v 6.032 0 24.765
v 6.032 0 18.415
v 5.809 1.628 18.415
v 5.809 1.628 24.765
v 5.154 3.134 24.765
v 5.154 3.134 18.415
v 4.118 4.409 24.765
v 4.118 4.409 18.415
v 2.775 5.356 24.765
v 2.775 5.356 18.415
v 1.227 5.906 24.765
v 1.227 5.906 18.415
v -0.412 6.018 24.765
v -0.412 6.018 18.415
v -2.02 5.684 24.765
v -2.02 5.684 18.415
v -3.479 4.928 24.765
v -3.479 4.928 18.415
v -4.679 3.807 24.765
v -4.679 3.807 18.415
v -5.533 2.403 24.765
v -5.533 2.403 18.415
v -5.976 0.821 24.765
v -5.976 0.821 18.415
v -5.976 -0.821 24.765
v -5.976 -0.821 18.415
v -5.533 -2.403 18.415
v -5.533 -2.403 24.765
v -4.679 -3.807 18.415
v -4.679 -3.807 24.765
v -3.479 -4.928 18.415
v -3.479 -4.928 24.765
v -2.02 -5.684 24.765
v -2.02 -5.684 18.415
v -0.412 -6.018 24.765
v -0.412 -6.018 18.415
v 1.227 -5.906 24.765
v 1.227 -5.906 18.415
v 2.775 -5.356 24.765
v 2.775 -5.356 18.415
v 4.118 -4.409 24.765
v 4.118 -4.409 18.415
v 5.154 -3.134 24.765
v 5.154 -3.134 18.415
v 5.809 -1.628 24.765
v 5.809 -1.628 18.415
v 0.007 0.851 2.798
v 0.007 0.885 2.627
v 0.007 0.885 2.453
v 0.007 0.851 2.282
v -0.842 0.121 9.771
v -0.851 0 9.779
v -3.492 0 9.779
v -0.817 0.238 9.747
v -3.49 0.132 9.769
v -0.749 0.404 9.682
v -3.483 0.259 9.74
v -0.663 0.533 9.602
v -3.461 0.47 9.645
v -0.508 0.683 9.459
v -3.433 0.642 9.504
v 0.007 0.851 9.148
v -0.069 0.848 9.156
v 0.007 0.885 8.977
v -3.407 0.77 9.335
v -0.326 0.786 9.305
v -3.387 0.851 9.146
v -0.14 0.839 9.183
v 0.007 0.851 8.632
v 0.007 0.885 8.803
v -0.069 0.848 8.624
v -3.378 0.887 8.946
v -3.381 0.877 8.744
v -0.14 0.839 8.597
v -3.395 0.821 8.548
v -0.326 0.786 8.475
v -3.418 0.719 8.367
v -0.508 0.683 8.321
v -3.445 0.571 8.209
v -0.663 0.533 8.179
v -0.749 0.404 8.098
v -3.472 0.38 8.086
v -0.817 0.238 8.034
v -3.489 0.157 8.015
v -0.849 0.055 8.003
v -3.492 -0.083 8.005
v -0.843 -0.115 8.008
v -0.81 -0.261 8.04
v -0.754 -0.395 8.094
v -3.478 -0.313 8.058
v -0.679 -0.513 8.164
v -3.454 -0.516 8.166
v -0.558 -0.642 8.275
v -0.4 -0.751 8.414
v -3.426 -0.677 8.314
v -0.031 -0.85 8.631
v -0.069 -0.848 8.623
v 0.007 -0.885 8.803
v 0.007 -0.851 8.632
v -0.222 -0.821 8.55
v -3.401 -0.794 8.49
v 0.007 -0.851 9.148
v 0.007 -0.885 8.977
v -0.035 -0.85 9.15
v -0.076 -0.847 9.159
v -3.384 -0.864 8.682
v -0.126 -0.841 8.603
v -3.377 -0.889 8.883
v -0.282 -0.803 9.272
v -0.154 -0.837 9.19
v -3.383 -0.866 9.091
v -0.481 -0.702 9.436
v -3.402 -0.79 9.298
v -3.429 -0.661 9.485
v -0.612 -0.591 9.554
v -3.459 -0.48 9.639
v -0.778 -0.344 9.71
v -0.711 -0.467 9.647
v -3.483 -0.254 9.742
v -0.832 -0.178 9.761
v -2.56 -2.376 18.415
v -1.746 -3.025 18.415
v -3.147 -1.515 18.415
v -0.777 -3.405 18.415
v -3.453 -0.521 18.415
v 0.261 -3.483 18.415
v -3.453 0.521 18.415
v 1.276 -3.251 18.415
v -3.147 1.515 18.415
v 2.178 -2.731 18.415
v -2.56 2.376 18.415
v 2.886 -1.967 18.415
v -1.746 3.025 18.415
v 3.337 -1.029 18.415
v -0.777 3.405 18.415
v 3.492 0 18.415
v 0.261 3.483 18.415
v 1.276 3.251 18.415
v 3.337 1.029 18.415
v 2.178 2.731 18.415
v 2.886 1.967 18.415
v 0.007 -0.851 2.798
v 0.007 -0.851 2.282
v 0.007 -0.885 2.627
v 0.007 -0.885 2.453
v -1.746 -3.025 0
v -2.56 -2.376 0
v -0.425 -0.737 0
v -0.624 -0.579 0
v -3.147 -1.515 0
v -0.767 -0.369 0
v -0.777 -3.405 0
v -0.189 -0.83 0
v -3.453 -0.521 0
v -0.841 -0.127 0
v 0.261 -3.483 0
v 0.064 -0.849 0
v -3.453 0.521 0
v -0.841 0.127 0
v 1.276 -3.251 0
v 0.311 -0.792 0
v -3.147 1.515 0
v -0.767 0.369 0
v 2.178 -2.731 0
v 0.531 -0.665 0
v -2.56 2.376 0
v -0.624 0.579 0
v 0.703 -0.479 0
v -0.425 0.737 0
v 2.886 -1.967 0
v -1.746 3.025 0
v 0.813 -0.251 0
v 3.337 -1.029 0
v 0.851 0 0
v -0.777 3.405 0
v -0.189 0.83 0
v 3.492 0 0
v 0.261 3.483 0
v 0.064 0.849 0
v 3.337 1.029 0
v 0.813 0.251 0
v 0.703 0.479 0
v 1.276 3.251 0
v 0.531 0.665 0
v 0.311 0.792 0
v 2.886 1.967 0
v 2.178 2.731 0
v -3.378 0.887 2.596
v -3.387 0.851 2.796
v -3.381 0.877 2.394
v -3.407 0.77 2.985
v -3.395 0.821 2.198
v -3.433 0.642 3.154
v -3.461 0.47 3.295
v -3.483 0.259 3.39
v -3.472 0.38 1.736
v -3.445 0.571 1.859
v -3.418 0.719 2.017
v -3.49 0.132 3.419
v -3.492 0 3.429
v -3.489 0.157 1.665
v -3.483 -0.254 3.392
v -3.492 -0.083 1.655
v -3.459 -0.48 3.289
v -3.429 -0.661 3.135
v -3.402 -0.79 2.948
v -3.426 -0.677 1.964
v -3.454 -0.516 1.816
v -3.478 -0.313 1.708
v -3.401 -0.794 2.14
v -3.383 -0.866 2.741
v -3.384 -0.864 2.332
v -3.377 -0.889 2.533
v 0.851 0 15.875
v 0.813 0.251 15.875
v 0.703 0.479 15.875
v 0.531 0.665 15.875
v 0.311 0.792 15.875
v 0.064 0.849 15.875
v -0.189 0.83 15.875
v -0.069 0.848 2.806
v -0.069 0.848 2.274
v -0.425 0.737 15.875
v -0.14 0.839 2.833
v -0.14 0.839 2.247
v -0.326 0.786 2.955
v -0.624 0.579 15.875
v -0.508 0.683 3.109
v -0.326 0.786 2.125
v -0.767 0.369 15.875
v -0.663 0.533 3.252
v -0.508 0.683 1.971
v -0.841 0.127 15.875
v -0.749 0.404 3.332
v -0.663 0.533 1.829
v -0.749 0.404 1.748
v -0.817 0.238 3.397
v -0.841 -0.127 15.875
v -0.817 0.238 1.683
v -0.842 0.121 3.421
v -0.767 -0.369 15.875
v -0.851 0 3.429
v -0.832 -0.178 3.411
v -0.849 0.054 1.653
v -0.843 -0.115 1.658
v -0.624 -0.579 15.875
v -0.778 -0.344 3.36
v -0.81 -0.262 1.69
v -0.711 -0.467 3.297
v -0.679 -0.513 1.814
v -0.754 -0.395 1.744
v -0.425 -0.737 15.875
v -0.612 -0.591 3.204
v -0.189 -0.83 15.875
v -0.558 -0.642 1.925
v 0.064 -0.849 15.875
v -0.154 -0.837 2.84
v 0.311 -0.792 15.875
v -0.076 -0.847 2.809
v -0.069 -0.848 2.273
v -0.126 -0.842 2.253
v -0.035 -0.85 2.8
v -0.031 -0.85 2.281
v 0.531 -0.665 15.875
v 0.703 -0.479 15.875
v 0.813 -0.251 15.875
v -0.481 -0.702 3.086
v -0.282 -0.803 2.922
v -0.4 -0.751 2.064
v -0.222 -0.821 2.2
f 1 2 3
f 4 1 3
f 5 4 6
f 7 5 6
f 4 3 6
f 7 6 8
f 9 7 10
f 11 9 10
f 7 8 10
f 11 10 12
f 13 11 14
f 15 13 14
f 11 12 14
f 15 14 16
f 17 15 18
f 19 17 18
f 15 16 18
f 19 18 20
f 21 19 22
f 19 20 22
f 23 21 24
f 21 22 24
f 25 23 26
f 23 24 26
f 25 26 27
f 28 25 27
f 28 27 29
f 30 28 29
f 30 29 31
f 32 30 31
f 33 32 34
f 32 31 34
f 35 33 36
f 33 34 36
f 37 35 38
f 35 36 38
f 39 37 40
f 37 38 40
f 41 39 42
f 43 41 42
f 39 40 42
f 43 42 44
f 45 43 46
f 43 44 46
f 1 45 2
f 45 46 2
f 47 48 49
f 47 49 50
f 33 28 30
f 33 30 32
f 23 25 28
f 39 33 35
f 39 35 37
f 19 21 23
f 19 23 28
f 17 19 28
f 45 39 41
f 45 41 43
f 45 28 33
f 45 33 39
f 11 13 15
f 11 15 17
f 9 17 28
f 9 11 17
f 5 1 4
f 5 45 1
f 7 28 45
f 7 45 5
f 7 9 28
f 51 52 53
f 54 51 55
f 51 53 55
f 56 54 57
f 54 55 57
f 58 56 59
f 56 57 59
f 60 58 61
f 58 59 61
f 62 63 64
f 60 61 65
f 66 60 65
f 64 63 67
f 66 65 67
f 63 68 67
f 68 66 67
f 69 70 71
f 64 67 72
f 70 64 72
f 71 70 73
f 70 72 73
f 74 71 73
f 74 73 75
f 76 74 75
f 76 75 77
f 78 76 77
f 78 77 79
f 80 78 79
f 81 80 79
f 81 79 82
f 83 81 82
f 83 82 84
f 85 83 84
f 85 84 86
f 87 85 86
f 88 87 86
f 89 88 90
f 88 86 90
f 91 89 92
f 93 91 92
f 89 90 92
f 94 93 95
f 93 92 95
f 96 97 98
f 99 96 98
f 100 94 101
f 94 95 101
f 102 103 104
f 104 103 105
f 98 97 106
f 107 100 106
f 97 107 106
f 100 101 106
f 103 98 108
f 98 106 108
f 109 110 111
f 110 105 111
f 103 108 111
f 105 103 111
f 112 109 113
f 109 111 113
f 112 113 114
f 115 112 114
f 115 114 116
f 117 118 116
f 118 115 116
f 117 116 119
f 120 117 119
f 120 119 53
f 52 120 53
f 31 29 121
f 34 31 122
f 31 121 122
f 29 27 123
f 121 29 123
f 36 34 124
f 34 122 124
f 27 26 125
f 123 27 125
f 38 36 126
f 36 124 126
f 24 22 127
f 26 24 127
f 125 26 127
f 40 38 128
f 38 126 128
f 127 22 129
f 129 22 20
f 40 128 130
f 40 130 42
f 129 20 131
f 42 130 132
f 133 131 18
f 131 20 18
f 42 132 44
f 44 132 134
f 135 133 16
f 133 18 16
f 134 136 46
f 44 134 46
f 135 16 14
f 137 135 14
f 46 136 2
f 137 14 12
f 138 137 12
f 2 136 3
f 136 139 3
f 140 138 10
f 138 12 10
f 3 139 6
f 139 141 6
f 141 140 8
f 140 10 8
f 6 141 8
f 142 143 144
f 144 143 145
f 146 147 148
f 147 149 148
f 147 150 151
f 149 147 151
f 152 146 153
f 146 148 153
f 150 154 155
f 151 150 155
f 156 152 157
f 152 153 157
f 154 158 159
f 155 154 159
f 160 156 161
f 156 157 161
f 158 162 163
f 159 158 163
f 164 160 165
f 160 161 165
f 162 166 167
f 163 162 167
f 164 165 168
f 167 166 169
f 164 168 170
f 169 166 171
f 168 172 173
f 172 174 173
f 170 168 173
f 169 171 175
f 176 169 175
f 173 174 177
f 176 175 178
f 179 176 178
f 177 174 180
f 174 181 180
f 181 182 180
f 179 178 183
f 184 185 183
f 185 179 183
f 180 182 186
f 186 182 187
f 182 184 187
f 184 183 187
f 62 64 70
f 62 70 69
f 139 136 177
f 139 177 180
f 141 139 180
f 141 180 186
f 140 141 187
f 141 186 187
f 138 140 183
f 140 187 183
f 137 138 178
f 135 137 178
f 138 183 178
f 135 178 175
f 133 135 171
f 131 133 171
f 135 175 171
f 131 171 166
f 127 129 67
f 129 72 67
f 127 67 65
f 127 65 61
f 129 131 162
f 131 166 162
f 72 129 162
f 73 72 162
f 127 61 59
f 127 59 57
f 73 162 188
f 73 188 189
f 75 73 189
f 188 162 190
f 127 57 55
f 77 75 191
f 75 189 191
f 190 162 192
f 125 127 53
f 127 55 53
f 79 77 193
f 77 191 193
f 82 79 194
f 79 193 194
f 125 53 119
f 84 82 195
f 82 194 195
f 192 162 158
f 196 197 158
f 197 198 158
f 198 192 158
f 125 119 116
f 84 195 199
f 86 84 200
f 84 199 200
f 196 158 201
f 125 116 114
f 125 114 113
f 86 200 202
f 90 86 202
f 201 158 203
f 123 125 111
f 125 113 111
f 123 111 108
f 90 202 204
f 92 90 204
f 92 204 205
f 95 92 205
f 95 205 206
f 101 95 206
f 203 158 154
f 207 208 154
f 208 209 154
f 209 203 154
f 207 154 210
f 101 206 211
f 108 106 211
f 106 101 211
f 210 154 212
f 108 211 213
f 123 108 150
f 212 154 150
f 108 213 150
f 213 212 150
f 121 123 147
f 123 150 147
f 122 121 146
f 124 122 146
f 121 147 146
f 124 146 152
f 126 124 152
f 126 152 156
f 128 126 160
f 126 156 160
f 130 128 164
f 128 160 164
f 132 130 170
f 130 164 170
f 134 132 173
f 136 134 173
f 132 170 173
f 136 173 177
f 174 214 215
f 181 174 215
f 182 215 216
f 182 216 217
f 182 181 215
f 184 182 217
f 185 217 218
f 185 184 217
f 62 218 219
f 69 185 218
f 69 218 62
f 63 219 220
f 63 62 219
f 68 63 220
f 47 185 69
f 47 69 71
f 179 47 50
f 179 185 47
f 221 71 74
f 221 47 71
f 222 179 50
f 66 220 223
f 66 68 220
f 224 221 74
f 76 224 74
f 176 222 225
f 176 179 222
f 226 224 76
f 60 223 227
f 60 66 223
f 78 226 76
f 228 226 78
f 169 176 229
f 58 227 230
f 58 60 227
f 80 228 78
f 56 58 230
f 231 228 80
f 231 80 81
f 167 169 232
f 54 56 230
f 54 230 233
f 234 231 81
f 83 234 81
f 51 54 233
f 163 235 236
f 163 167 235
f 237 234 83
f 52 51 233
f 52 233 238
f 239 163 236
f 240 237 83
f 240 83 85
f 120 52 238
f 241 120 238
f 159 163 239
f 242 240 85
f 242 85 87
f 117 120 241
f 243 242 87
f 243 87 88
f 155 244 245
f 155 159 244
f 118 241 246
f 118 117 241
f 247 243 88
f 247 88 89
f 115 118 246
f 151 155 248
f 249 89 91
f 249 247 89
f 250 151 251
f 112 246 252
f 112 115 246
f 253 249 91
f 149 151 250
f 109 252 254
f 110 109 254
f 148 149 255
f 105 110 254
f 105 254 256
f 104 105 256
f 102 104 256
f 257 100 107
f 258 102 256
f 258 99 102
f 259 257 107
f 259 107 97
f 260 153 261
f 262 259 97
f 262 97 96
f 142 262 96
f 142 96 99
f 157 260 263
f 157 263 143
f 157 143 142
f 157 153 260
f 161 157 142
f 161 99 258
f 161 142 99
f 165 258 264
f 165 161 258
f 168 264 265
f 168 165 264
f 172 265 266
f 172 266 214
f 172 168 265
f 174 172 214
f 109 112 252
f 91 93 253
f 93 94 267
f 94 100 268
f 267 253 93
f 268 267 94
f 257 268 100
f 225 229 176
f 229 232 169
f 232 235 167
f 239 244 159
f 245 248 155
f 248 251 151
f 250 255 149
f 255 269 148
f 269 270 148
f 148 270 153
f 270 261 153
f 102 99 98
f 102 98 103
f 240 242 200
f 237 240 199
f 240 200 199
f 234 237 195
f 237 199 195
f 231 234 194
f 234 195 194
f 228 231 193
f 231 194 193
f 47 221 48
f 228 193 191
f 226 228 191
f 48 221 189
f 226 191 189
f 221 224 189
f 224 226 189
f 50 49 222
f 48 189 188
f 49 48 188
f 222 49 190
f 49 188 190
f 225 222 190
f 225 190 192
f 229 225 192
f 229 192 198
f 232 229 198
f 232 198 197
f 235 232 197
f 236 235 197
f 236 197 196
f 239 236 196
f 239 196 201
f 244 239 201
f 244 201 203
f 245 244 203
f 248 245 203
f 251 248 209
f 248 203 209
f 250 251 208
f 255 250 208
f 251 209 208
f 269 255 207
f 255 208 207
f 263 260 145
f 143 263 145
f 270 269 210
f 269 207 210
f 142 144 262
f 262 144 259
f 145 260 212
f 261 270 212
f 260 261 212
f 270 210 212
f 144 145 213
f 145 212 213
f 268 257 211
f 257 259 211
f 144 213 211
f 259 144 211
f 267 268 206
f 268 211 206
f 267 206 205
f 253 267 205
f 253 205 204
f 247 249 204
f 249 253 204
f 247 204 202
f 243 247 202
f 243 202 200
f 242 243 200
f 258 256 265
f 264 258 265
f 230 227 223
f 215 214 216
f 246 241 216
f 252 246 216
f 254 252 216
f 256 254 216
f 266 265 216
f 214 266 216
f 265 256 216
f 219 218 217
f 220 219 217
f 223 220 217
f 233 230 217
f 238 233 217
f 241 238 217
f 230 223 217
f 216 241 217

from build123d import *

# Parameters (mm, degrees)
SKETCH1_R           = 3.4925
SKETCH1_R_2         = 0.8509
BOSS_EXTRUDE1_DEPTH = 15.875
SKETCH2_R           = 3.4925
BOSS_EXTRUDE2_DEPTH = 2.54
SKETCH3_R           = 6.0325
BOSS_EXTRUDE3_DEPTH = 6.35
SKETCH4_R           = 0.889
CUT_EXTRUDE1_DEPTH  = 3.5


with BuildPart() as part:
    # Sketch1 → Boss-Extrude1 (new body)
    with BuildSketch(Plane.XY):
        Circle(SKETCH1_R)
        Circle(SKETCH1_R_2, mode=Mode.SUBTRACT)
    extrude(amount=BOSS_EXTRUDE1_DEPTH)

    # Sketch2 → Boss-Extrude2 (add)
    with BuildSketch(Plane.XY.offset(15.875)):
        Circle(SKETCH2_R)
    extrude(amount=BOSS_EXTRUDE2_DEPTH)

    # Sketch3 → Boss-Extrude3 (add)
    with BuildSketch(Plane.XY.offset(18.415)):
        Circle(SKETCH3_R)
    extrude(amount=BOSS_EXTRUDE3_DEPTH)

    # Sketch4 → Cut-Extrude1 (cut)
    with BuildSketch(Plane.ZY.offset(3.4925)):
        with Locations((2.54, 0)):
            Circle(SKETCH4_R)
        with Locations((8.89, 0)):
            Circle(SKETCH4_R)
    extrude(amount=-CUT_EXTRUDE1_DEPTH, mode=Mode.SUBTRACT)


solid = part.part
